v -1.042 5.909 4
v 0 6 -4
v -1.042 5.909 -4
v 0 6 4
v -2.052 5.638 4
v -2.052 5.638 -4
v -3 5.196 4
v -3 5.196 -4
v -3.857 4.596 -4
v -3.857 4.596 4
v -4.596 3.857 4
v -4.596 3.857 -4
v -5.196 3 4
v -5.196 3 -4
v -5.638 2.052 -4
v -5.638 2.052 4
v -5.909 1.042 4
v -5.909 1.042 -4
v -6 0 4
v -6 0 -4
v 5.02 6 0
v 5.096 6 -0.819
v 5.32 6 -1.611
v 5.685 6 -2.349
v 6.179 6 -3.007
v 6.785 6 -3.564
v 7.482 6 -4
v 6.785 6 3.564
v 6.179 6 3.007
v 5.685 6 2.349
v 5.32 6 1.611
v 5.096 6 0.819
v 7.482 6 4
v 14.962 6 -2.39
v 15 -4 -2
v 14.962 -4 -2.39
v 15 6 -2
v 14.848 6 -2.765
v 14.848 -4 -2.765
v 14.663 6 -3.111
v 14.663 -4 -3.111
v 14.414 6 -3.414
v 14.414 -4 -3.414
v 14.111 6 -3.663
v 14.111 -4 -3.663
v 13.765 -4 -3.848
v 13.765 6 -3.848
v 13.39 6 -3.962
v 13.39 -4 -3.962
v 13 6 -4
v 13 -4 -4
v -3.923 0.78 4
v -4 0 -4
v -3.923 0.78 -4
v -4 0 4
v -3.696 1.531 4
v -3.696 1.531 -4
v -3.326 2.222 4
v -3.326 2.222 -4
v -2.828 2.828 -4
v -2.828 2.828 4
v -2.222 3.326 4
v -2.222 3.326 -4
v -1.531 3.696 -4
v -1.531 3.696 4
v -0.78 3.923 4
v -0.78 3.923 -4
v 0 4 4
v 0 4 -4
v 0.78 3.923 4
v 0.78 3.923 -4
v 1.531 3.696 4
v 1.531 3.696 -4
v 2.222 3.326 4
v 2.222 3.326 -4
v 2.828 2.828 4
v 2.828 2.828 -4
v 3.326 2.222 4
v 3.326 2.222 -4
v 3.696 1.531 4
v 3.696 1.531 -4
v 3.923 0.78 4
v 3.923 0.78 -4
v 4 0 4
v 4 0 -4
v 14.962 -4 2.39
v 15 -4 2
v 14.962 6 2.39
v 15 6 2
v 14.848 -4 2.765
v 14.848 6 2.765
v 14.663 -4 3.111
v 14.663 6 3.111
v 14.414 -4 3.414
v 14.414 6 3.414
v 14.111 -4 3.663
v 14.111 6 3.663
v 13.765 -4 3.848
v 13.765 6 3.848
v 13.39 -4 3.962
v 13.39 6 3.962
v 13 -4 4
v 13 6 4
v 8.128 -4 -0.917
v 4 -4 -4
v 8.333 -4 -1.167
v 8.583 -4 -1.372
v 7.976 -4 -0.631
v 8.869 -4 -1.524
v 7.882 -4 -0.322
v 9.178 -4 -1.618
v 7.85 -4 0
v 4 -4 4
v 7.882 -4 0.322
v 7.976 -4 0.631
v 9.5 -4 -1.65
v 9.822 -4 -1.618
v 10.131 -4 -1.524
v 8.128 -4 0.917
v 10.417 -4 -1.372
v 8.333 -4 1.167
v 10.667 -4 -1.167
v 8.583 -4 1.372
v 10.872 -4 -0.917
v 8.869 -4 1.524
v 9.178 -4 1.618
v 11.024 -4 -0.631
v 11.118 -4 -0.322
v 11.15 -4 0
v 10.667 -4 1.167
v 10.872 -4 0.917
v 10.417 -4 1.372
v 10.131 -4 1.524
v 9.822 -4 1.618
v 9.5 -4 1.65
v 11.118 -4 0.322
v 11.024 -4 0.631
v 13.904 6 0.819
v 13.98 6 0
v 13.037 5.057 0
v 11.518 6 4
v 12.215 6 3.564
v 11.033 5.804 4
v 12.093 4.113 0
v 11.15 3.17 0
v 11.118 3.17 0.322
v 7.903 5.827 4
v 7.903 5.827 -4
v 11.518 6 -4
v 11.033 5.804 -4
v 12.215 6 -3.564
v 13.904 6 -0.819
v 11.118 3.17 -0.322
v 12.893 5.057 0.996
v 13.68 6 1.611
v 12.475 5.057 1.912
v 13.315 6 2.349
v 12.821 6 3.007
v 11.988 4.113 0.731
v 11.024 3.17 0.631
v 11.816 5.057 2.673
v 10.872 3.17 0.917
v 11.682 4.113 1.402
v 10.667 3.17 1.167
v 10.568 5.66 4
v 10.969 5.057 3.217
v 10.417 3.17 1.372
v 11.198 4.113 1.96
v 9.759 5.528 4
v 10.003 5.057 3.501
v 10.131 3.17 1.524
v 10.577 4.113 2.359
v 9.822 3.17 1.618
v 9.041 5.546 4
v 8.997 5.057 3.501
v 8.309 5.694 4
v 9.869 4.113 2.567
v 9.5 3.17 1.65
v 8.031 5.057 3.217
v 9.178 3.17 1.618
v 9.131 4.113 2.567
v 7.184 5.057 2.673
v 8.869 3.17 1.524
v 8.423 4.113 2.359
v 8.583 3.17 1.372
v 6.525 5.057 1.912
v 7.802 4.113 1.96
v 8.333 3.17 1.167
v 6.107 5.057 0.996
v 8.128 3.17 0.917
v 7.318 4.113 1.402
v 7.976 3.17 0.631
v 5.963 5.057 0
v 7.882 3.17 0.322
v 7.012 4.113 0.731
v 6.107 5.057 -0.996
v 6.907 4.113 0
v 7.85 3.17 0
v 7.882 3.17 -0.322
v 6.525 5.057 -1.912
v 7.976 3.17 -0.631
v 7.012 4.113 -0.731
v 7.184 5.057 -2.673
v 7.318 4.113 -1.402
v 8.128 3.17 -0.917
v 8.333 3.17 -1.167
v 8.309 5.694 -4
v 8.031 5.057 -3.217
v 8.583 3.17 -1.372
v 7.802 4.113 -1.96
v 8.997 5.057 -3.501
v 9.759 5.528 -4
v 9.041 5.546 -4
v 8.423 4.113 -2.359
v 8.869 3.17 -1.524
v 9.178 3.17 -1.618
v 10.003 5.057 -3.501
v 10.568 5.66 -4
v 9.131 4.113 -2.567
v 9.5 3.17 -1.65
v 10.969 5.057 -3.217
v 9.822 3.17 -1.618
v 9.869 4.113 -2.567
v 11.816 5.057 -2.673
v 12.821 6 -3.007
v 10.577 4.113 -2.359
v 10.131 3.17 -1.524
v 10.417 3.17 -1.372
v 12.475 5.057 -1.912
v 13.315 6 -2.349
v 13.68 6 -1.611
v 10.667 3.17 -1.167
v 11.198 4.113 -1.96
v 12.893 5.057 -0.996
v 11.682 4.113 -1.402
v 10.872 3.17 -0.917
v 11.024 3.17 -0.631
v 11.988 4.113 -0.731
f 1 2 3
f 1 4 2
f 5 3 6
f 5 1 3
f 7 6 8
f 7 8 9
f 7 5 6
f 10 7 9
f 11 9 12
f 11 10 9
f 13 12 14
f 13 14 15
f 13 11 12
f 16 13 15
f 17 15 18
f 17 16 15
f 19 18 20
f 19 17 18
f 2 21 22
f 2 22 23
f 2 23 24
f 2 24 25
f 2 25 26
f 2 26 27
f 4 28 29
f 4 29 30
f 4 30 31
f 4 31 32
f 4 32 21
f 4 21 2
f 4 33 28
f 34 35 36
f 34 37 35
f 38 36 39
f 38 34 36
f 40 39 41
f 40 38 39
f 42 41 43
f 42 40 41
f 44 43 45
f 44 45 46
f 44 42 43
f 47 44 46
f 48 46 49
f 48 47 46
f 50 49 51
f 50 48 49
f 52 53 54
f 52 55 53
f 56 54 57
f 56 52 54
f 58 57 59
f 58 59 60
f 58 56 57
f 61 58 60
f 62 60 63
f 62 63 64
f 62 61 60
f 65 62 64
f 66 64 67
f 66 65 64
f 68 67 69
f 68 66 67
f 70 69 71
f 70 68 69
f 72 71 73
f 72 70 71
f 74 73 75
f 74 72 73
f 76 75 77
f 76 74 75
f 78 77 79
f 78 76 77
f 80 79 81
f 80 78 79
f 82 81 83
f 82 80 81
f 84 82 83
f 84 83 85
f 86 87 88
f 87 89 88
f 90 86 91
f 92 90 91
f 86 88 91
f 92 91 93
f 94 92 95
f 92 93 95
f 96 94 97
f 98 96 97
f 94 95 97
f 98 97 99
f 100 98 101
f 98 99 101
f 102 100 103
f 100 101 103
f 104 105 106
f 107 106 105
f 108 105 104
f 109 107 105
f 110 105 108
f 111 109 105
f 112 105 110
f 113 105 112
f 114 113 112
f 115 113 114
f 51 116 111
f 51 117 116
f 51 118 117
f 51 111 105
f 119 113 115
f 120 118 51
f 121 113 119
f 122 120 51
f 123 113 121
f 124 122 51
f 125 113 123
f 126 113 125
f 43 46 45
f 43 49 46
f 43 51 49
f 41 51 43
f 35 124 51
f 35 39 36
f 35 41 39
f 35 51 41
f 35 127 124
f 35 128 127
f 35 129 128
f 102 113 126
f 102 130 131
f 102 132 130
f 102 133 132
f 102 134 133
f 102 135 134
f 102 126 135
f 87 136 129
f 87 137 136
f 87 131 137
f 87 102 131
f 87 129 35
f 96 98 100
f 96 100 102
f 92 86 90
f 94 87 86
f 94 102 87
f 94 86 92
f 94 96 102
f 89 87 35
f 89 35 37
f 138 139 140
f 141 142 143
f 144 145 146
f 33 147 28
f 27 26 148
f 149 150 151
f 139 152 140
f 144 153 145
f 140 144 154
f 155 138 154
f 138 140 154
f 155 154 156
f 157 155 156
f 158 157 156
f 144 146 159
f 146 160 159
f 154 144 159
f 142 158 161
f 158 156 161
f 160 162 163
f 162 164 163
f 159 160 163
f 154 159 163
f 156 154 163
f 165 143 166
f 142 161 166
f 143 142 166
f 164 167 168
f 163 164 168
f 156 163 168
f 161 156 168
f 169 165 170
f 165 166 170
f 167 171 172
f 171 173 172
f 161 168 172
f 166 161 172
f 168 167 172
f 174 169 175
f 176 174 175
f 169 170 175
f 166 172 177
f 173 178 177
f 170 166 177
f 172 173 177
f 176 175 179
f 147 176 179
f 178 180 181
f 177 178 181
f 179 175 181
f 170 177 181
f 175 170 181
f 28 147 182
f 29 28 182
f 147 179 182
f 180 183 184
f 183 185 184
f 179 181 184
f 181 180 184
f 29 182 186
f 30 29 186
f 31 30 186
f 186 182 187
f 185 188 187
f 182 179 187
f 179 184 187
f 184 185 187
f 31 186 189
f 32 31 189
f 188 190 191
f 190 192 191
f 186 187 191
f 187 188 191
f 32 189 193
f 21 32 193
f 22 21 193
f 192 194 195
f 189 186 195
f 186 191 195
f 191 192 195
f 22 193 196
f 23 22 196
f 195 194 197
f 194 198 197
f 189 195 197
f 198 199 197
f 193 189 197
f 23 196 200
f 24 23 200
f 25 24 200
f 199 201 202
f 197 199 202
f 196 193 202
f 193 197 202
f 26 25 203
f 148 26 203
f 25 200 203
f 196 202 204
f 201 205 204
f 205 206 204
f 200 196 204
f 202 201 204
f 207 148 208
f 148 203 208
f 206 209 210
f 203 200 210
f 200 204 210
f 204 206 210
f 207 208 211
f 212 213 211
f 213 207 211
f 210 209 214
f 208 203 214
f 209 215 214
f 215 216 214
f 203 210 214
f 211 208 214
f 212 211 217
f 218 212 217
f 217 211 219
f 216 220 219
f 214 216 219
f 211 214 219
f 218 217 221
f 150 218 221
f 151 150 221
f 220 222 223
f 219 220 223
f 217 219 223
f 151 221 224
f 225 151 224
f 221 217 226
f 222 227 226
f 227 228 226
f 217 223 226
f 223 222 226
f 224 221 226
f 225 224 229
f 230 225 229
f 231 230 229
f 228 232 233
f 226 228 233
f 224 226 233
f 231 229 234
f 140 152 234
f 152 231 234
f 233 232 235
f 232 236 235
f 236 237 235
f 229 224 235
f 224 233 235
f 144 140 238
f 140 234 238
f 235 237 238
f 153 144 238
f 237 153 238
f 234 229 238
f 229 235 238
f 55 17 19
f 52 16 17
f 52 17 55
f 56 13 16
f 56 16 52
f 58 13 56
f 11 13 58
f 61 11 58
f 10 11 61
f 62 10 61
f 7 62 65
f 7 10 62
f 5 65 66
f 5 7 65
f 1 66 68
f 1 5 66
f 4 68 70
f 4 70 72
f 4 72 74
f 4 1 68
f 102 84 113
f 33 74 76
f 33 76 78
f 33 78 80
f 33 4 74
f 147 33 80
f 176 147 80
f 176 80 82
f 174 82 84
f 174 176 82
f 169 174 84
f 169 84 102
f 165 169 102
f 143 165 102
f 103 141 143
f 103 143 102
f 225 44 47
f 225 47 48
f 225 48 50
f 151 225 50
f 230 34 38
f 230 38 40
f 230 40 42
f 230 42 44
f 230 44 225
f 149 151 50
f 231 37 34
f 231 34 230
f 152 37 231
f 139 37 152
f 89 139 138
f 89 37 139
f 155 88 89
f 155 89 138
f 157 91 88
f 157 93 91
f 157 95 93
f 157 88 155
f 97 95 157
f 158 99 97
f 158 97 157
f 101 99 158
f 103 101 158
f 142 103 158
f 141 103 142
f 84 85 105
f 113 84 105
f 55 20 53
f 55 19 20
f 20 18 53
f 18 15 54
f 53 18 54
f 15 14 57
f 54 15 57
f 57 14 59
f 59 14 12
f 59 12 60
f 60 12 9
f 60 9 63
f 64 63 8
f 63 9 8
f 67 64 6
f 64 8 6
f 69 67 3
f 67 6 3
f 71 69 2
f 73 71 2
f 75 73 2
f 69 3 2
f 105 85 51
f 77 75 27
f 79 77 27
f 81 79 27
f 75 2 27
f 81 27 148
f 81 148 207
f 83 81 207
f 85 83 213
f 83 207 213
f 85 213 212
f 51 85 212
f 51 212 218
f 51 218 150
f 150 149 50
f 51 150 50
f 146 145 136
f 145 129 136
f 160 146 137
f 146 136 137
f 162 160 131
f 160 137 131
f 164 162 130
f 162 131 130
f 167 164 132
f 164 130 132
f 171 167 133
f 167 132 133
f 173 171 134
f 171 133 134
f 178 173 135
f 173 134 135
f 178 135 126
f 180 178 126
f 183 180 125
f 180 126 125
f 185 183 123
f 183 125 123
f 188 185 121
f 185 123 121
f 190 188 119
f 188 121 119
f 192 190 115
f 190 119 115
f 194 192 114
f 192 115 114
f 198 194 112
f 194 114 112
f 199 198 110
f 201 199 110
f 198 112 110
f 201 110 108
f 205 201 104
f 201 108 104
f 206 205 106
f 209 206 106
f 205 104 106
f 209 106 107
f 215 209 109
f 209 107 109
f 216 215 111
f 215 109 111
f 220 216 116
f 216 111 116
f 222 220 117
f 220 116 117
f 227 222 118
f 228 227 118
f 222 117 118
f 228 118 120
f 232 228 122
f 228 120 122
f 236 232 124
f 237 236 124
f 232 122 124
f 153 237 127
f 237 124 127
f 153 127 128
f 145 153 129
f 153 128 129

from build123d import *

# Parameters (mm, degrees)
F1_DEPTH       = 4
F3_D           = 3.3
F3_CSINK_D     = 8.96
F3_CSINK_ANGLE = 90
F4_R           = 2


with BuildPart() as f1:
    # F0 (on Top) → F1 (new body, symmetric)
    with BuildSketch(Plane.XY):
        with BuildLine():
            ThreePointArc((-4, 0), (0, 4), (4, 0))
            Line((4, 0), (4, -4))
            Line((4, -4), (15, -4))
            Line((15, -4), (15, 6))
            Line((15, 6), (0, 6))
            ThreePointArc((0, 6), (-4.2426406871, 4.2426406871), (-6, 0))
            Line((-6, 0), (-4, 0))
        make_face()
    extrude(amount=F1_DEPTH, both=True)

    # F3 (through all)
    with Locations(Plane(origin=(0, 6, 0), x_dir=(-1, 0, 0), z_dir=(0, 1, 0))):
        with Locations((-9.5, 0)):
            CounterSinkHole(F3_D / 2, F3_CSINK_D / 2, counter_sink_angle=F3_CSINK_ANGLE)

    # F4
    f4_edges = [f1.edges().sort_by_distance(p)[0] for p in [
        (15, 1, -4),
        (15, 1, 4),
    ]]
    fillet(f4_edges, radius=F4_R)


solid = f1.part
